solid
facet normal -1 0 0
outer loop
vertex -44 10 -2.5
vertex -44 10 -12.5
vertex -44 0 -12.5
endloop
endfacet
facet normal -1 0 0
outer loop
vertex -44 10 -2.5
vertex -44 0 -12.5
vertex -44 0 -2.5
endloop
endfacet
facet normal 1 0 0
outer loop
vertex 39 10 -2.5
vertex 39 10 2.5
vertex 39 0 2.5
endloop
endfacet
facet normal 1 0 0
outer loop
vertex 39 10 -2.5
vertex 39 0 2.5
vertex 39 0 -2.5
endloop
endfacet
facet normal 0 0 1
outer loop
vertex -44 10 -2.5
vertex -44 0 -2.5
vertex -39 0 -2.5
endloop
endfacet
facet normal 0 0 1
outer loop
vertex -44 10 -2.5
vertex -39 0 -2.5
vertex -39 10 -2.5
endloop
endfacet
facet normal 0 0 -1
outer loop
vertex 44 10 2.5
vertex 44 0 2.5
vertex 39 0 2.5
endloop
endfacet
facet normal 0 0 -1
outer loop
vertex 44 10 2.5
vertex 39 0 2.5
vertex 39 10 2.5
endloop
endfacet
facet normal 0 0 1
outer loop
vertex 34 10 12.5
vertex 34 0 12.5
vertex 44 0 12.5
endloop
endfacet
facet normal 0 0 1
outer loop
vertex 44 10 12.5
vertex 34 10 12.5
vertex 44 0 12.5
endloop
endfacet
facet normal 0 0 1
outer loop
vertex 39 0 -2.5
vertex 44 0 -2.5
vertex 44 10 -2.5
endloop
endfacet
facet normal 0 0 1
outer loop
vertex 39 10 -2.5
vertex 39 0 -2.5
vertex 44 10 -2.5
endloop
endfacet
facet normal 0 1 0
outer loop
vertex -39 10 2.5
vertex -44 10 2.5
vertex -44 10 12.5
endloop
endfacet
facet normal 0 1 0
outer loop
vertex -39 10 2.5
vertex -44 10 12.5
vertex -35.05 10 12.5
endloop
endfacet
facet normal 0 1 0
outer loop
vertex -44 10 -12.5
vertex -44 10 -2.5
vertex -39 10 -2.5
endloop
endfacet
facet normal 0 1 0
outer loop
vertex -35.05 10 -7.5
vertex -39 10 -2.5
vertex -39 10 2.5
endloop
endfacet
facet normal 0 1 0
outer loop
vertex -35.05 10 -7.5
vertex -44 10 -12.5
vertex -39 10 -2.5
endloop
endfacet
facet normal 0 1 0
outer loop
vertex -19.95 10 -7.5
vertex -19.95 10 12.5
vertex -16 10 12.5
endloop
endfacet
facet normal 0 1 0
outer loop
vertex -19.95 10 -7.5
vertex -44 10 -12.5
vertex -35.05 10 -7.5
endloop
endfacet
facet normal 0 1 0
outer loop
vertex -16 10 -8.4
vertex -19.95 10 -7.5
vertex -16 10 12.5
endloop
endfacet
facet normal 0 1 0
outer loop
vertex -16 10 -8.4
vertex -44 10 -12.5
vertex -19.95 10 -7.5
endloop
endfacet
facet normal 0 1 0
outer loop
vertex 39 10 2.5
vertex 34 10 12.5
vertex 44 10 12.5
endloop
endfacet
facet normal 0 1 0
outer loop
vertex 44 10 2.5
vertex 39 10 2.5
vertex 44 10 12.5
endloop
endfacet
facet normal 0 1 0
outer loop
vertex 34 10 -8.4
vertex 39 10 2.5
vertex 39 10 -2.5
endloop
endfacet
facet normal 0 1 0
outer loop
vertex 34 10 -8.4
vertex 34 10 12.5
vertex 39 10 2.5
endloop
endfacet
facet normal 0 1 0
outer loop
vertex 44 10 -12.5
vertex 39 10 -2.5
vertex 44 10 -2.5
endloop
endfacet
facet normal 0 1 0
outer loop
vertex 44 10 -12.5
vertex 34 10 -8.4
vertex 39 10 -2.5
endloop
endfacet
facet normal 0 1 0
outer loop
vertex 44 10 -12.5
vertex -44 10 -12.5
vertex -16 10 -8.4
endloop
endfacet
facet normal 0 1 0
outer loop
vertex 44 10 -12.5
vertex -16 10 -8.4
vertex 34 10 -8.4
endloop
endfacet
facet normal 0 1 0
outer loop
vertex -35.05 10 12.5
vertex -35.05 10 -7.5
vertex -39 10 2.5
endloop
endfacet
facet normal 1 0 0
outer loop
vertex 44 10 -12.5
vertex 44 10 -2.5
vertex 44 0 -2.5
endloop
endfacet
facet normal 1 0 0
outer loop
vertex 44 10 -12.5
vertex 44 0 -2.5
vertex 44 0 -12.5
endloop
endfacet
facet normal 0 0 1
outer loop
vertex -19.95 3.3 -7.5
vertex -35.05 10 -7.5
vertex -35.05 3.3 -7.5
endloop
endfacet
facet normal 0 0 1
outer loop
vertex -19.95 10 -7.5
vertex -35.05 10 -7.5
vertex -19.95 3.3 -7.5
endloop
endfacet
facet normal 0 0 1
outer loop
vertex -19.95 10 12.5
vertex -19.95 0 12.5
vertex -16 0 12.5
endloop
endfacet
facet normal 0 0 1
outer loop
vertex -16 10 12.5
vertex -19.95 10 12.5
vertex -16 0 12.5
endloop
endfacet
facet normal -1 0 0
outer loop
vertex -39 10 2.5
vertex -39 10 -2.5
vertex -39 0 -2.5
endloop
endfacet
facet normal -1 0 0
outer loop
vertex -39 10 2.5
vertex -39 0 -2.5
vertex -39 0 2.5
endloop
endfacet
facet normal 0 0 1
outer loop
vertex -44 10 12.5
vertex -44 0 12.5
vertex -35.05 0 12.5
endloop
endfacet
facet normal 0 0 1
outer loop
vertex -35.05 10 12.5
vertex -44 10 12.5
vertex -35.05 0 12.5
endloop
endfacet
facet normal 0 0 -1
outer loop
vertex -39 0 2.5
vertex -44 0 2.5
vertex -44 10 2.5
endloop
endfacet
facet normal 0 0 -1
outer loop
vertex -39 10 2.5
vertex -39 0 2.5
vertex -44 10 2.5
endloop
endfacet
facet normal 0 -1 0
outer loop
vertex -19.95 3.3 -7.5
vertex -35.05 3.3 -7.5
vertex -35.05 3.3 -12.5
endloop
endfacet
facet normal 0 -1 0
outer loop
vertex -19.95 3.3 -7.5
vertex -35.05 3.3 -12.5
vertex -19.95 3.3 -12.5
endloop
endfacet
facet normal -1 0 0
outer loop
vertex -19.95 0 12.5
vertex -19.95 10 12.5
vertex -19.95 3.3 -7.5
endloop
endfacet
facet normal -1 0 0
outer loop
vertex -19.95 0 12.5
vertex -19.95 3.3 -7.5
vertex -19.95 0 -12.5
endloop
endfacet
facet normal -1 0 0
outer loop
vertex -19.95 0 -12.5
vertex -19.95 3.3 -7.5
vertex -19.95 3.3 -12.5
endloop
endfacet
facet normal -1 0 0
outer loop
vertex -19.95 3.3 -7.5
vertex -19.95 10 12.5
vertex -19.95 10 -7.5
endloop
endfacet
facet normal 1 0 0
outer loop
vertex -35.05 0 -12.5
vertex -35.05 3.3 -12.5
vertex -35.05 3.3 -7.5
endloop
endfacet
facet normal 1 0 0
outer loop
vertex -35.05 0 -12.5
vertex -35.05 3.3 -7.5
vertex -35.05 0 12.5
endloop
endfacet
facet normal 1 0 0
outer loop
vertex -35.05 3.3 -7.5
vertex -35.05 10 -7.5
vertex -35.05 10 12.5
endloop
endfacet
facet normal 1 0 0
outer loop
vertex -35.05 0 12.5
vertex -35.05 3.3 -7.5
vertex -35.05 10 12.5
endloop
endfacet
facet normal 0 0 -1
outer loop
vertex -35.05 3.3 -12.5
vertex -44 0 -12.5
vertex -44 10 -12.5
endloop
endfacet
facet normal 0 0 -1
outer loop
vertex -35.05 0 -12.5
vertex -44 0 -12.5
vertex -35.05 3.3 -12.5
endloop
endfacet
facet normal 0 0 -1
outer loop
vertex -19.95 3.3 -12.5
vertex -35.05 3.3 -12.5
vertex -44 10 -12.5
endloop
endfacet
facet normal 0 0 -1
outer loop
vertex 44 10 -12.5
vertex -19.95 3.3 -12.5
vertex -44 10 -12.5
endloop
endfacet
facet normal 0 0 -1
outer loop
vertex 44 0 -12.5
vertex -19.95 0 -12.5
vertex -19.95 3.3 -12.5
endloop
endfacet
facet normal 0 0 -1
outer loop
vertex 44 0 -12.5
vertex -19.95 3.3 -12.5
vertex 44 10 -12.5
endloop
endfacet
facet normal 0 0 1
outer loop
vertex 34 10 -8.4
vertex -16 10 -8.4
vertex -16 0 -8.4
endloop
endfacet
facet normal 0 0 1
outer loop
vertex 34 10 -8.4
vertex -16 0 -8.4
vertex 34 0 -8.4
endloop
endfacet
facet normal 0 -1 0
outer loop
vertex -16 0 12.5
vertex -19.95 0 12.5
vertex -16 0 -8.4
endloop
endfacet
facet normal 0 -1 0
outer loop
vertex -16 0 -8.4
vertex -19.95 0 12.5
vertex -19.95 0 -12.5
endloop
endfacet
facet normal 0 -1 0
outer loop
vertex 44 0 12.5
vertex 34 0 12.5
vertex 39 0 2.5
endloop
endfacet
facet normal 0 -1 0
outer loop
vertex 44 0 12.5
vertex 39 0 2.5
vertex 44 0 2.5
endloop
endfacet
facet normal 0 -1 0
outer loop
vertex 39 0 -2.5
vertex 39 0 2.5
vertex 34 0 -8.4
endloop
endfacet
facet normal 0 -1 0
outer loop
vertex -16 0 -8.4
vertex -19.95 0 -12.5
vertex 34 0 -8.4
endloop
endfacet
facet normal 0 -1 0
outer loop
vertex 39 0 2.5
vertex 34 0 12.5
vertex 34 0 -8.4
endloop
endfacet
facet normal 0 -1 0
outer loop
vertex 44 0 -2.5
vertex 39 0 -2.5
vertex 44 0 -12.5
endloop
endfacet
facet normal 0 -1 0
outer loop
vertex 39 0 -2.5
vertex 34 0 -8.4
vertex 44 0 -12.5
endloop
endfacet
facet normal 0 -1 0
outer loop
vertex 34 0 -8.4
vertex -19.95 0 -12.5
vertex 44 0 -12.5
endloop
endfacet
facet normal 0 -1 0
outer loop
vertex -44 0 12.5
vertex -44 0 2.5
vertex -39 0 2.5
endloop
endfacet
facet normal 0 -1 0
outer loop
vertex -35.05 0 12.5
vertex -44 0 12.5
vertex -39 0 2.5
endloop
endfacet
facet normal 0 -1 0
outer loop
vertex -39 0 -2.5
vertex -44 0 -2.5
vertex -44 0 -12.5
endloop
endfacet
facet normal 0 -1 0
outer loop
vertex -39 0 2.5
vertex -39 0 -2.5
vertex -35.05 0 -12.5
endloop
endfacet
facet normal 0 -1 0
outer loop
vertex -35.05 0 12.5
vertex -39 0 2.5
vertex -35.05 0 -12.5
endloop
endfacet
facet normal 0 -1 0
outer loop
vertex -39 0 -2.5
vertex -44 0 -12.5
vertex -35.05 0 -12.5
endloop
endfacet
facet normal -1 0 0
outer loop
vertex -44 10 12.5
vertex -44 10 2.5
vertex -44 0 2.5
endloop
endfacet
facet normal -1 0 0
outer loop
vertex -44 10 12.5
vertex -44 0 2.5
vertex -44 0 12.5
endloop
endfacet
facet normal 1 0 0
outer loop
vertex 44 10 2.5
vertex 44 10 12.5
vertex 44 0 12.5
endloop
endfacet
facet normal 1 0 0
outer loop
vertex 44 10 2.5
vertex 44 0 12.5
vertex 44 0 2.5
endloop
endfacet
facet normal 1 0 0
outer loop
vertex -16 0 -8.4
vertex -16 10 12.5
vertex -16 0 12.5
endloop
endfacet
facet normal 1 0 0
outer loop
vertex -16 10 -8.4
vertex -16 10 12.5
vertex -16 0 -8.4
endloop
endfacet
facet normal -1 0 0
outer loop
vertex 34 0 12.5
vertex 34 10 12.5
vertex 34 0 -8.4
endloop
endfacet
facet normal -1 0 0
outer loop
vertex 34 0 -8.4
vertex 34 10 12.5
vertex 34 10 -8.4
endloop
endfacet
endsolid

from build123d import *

# Parameters (mm, degrees)
SKETCH1_W           = 98
SKETCH1_H           = 25
BOSS_EXTRUDE1_DEPTH = 10
SKETCH4_W           = 25
SKETCH4_H           = 10
CUT_EXTRUDE6_DEPTH  = 5
SKETCH5_W           = 25
SKETCH5_H           = 10
CUT_EXTRUDE7_DEPTH  = 5
SKETCH6_W           = 5
SKETCH6_H           = 10
CUT_EXTRUDE8_DEPTH  = 5
SKETCH7_W           = 5
SKETCH7_H           = 10
CUT_EXTRUDE9_DEPTH  = 5
SKETCH8_W           = 50
SKETCH8_H           = 20.9
CUT_EXTRUDE10_DEPTH = 13
SKETCH9_W           = 15.1
SKETCH9_H           = 7.5
SKETCH9_H_2         = 12.5
CUT_EXTRUDE11_DEPTH = 13
SKETCH10_W          = 15.1
SKETCH10_H          = 5
CUT_EXTRUDE12_DEPTH = 3.3


with BuildPart() as part:
    # Sketch1 → Boss-Extrude1 (new body)
    with BuildSketch(Plane(origin=(0, 0, 0), x_dir=(1, 0, 0), z_dir=(0, 1, 0))):
        Rectangle(SKETCH1_W, SKETCH1_H)
    extrude(amount=BOSS_EXTRUDE1_DEPTH)

    # Sketch4 → Cut-Extrude6 (cut)
    with BuildSketch(Plane.ZY.offset(49)):
        with Locations((0, 5)):
            Rectangle(SKETCH4_W, SKETCH4_H)
    extrude(amount=-CUT_EXTRUDE6_DEPTH, mode=Mode.SUBTRACT)

    # Sketch5 → Cut-Extrude7 (cut)
    with BuildSketch(Plane(origin=(49, 0, 0), x_dir=(0, 0, -1), z_dir=(1, 0, 0))):
        with Locations((0, 5)):
            Rectangle(SKETCH5_W, SKETCH5_H)
    extrude(amount=-CUT_EXTRUDE7_DEPTH, mode=Mode.SUBTRACT)

    # Sketch6 → Cut-Extrude8 (cut)
    with BuildSketch(Plane(origin=(44, 0, 0), x_dir=(0, 0, -1), z_dir=(1, 0, 0))):
        with Locations((0, 5)):
            Rectangle(SKETCH6_W, SKETCH6_H)
    extrude(amount=-CUT_EXTRUDE8_DEPTH, mode=Mode.SUBTRACT)

    # Sketch7 → Cut-Extrude9 (cut)
    with BuildSketch(Plane.ZY.offset(44)):
        with Locations((0, 5)):
            Rectangle(SKETCH7_W, SKETCH7_H)
    extrude(amount=-CUT_EXTRUDE9_DEPTH, mode=Mode.SUBTRACT)

    # Sketch8 → Cut-Extrude10 (cut)
    with BuildSketch(Plane(origin=(0, 10, 0), x_dir=(1, 0, 0), z_dir=(0, 1, 0))):
        with Locations((9, -2.05)):
            Rectangle(SKETCH8_W, SKETCH8_H)
    extrude(amount=-CUT_EXTRUDE10_DEPTH, mode=Mode.SUBTRACT)

    # Sketch9 → Cut-Extrude11 (cut)
    with BuildSketch(Plane(origin=(0, 10, 0), x_dir=(1, 0, 0), z_dir=(0, 1, 0))):
        with Locations((-27.5, 3.75)):
            Rectangle(SKETCH9_W, SKETCH9_H)
        with Locations((-27.5, -6.25)):
            Rectangle(SKETCH9_W, SKETCH9_H_2)
    extrude(amount=-CUT_EXTRUDE11_DEPTH, mode=Mode.SUBTRACT)

    # Sketch10 → Cut-Extrude12 (cut)
    with BuildSketch(Plane.XZ):
        with Locations((-27.5, -10)):
            Rectangle(SKETCH10_W, SKETCH10_H)
    extrude(amount=-CUT_EXTRUDE12_DEPTH, mode=Mode.SUBTRACT)


solid = part.part
